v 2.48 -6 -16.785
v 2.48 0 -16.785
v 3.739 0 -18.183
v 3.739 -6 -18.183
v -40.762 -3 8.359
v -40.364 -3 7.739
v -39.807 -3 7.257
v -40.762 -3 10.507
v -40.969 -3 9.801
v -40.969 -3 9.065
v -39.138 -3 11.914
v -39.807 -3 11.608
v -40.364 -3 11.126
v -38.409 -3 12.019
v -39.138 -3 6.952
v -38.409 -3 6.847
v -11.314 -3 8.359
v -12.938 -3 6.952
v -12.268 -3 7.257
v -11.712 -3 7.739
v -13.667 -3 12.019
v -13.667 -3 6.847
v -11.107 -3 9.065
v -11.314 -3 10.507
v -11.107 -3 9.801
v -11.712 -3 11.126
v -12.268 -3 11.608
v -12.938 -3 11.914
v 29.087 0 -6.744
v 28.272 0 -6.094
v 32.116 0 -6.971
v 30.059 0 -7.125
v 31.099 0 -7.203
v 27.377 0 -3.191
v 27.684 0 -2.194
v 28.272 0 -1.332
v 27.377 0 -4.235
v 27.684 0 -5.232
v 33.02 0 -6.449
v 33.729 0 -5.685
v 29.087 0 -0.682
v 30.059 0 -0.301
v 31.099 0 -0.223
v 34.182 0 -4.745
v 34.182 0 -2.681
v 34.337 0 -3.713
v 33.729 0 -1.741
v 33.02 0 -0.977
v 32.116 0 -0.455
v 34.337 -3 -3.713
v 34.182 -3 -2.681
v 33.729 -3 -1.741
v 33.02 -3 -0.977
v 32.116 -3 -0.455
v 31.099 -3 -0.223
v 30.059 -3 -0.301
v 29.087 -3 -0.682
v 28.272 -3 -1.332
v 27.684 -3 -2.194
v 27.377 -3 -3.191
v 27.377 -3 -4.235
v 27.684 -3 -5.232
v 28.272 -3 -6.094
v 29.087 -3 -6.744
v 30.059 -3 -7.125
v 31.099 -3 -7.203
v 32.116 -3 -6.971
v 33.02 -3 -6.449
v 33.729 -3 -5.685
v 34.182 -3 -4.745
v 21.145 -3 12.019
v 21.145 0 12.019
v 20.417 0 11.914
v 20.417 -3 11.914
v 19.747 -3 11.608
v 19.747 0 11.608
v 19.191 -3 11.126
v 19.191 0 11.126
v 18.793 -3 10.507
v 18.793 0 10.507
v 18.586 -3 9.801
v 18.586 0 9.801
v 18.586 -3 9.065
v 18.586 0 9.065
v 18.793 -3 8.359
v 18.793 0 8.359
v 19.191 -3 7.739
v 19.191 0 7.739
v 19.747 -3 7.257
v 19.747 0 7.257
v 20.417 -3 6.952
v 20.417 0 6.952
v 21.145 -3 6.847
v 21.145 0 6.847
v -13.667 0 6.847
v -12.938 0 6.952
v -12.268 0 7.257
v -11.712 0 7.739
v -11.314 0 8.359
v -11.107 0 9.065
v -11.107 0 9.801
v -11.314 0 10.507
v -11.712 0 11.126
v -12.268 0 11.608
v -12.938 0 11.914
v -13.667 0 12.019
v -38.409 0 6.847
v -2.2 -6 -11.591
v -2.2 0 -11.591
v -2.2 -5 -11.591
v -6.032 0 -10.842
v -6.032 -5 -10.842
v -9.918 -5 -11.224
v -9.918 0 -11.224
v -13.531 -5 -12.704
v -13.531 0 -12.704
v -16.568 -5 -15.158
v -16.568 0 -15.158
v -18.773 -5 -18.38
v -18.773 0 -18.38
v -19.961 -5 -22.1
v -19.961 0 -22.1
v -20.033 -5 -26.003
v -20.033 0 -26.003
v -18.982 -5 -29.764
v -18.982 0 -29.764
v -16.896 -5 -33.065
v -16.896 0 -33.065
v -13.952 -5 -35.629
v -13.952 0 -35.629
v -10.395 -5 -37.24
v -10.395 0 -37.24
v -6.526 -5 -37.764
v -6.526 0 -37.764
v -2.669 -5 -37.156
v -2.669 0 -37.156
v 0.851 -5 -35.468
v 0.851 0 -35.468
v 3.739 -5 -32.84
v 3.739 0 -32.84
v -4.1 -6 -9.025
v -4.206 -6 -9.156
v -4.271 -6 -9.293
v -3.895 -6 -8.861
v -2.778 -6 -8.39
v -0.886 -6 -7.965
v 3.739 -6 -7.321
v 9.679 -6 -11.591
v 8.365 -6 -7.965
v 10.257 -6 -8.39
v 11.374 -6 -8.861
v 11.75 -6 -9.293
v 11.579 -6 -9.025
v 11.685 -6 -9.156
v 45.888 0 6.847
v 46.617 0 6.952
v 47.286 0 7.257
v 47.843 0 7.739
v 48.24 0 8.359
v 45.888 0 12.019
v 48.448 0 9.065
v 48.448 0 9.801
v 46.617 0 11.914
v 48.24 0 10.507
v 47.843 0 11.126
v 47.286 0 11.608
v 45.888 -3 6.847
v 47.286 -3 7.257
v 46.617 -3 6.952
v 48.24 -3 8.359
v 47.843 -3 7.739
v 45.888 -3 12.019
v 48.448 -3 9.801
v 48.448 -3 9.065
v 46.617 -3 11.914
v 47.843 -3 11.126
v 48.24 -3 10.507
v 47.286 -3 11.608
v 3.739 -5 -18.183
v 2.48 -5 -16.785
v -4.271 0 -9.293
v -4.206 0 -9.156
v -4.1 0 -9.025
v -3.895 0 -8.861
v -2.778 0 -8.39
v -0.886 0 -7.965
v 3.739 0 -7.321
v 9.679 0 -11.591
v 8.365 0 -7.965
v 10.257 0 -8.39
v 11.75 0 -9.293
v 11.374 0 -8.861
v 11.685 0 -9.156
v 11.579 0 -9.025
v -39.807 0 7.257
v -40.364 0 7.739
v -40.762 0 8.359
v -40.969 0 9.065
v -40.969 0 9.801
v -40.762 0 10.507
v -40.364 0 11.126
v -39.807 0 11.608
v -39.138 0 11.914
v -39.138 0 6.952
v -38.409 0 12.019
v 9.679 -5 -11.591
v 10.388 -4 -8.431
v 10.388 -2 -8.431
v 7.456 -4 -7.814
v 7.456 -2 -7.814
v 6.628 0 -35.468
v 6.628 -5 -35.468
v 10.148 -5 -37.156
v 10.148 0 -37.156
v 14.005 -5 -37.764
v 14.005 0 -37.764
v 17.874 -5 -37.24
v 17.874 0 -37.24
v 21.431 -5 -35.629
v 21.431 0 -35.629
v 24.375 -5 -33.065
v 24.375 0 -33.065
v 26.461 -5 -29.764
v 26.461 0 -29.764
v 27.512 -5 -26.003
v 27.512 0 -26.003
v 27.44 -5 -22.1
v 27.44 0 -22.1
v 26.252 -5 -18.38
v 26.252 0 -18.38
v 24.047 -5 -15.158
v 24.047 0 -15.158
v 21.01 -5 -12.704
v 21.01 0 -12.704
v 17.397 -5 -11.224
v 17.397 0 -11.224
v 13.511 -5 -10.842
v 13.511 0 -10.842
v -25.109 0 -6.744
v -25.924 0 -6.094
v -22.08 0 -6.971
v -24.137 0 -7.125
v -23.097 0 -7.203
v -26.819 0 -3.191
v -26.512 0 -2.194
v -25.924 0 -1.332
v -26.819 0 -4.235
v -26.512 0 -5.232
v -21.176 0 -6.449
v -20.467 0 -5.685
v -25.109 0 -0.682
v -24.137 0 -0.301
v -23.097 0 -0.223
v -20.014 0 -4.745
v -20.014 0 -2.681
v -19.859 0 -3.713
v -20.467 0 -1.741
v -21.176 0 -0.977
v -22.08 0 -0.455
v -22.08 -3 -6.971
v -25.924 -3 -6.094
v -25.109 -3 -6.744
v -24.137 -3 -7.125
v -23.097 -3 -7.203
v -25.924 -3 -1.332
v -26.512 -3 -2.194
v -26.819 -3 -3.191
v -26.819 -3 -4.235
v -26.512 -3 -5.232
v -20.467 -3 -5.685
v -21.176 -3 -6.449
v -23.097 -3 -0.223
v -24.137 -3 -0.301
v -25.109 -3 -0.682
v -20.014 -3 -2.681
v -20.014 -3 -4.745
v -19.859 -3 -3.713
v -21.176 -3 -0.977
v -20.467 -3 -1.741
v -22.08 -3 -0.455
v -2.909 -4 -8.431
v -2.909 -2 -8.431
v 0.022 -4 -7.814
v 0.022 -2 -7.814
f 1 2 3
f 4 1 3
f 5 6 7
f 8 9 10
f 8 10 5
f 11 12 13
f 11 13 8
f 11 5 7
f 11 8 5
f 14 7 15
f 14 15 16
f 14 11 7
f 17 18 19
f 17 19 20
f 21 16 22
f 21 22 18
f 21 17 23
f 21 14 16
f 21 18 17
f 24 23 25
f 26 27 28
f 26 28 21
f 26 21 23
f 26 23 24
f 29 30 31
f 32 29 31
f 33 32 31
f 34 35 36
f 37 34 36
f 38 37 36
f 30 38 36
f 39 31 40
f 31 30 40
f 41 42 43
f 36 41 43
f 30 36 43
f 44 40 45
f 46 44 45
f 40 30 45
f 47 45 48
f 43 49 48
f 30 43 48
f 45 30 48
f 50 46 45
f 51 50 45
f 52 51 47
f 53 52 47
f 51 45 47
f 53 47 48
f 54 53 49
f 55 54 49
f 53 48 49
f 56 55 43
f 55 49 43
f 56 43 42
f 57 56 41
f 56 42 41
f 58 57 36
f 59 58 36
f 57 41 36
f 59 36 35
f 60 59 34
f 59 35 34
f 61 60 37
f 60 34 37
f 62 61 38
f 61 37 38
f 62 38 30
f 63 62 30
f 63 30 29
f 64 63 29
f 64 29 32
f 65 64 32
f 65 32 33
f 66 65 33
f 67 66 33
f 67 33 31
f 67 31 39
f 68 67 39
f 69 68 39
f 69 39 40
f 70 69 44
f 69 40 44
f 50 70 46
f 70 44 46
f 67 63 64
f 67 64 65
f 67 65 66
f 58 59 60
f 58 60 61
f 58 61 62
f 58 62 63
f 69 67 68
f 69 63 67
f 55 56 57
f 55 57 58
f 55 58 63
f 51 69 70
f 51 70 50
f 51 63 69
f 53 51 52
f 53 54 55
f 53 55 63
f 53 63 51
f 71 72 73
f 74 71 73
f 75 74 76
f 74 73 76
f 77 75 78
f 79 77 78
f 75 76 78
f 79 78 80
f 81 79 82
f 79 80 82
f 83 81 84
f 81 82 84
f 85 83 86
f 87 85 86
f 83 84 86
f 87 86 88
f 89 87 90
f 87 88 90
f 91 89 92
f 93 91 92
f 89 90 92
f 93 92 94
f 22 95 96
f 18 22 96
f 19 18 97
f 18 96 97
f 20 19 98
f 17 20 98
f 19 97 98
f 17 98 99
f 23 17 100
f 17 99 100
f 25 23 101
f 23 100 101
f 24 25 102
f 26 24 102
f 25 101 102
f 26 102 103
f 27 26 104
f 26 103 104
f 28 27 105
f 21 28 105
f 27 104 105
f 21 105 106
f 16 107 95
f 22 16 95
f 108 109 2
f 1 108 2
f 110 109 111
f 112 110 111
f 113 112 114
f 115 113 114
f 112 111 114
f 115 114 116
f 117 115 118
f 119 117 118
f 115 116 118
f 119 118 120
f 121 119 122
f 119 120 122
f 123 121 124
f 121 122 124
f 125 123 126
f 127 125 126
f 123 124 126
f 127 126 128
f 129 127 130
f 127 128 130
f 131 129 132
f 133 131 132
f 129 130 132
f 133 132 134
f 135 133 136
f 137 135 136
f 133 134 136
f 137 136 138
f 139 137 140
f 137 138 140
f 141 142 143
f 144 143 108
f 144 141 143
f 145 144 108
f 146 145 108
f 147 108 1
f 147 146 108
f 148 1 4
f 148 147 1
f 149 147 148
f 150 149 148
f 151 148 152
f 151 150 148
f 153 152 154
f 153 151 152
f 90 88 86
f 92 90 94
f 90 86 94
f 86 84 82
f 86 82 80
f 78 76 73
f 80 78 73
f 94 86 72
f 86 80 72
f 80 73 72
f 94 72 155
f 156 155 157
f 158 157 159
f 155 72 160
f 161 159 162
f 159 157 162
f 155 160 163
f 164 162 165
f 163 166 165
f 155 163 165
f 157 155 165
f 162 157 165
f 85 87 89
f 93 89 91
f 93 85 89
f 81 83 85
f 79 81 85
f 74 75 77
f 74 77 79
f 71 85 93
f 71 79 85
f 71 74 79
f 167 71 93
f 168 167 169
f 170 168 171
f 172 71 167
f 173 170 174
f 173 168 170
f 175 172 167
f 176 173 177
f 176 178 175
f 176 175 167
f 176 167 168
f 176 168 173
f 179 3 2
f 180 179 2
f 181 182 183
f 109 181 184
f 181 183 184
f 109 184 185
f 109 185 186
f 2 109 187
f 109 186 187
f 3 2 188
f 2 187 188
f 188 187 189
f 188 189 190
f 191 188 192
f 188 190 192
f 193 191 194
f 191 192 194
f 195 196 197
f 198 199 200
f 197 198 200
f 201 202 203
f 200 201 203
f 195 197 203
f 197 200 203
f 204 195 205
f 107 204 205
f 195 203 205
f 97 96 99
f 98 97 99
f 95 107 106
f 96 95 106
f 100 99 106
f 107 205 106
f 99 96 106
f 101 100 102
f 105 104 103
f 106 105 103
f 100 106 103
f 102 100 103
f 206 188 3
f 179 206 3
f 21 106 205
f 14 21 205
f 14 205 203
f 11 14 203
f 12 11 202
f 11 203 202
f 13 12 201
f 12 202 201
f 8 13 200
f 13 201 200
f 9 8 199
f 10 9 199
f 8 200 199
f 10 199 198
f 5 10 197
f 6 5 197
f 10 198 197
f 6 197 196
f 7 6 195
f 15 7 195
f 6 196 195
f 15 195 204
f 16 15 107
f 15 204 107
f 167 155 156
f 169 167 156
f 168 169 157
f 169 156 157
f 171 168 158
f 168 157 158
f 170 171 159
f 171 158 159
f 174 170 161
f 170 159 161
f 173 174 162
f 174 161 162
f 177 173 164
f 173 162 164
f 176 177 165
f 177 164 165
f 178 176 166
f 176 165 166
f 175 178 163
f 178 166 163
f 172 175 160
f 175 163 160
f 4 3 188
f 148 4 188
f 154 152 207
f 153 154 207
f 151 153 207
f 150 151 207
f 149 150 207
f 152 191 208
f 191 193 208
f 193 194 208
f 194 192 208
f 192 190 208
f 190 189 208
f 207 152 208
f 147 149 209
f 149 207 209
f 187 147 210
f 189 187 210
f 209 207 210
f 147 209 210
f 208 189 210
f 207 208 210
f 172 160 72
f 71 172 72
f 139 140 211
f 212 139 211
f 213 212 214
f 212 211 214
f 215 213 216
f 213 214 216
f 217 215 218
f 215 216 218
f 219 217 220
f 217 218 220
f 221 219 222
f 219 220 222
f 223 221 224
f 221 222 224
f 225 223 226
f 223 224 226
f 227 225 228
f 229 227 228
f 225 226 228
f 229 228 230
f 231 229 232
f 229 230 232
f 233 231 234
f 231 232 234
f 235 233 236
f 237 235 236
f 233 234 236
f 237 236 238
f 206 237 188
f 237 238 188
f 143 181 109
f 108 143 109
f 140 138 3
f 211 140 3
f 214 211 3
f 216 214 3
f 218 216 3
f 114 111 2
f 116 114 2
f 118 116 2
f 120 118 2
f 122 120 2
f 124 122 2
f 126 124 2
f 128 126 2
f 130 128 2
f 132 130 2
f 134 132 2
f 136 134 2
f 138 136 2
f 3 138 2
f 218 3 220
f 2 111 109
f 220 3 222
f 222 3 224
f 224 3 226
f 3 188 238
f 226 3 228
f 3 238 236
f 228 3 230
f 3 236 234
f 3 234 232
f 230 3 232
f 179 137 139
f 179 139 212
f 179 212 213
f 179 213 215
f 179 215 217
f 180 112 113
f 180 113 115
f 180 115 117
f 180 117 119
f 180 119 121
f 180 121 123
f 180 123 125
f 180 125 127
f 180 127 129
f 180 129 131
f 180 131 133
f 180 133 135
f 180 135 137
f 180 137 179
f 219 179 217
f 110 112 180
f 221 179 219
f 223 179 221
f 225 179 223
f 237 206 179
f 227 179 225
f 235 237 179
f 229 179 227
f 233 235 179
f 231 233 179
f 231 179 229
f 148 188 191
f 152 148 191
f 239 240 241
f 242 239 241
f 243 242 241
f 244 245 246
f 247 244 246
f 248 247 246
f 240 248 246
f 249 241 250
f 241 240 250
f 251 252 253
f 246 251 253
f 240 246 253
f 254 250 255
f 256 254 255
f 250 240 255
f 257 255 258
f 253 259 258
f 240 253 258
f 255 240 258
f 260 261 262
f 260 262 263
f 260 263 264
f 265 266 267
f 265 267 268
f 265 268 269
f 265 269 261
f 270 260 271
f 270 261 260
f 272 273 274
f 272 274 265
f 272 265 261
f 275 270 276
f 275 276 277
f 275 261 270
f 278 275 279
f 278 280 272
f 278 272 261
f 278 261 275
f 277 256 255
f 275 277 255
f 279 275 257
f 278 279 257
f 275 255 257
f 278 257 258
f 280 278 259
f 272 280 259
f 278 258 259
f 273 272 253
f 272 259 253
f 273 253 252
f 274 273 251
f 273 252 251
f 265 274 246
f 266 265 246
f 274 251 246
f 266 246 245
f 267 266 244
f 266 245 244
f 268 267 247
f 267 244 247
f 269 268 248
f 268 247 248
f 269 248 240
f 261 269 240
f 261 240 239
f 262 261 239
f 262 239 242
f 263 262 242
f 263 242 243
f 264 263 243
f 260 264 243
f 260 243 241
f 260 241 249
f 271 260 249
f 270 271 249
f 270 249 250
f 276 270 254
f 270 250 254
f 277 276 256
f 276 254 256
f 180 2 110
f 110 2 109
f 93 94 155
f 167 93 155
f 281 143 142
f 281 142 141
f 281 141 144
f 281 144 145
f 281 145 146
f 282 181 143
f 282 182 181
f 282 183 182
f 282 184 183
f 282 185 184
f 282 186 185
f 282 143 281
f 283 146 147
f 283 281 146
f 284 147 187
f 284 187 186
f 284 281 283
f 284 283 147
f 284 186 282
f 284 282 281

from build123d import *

# Parameters (mm, degrees)
F1_DEPTH = 3
F0_R     = 3.5
F2_DEPTH = 5
F3_DEPTH = 6


with BuildPart() as f1:
    # F0 (on Front) → F1 (new body)
    with BuildSketch(Plane.XZ):
        with BuildLine():
            Line((-38.4092436153, 6.8469699793), (-13.666519417, 6.8469699793))
            ThreePointArc((-13.666519417, 6.8469699793), (-11.0805620903, 9.432927306), (-13.666519417, 12.0188846326))
            Line((-13.666519417, 12.0188846326), (-38.4092436153, 12.0188846326))
            ThreePointArc((-38.4092436153, 12.0188846326), (-40.995200942, 9.432927306), (-38.4092436153, 6.8469699793))
        make_face()
    extrude(amount=F1_DEPTH)


with BuildPart() as f1b:
    # F0 (on Front) → F1, piece 2 (new body)
    with BuildSketch(Plane.XZ):
        with BuildLine():
            Line((45.8882047814, 12.0188846326), (21.145480583, 12.0188846326))
            ThreePointArc((21.145480583, 12.0188846326), (18.5595232563, 9.432927306), (21.145480583, 6.8469699793))
            Line((21.145480583, 6.8469699793), (45.8882047814, 6.8469699793))
            ThreePointArc((45.8882047814, 6.8469699793), (48.4741621081, 9.432927306), (45.8882047814, 12.0188846326))
        make_face()
    extrude(amount=F1_DEPTH)


with BuildPart() as f1c:
    # F0 (on Front) → F1, piece 3 (new body)
    with BuildSketch(Plane.XZ):
        with Locations((30.837480583, -3.7130300207)):
            Circle(F0_R)
    extrude(amount=F1_DEPTH)


with BuildPart() as f1d:
    # F0 (on Front) → F1, piece 4 (new body)
    with BuildSketch(Plane.XZ):
        with Locations((-23.358519417, -3.7130300207)):
            Circle(F0_R)
    extrude(amount=F1_DEPTH)


with BuildPart() as f2:
    # F0 (on Front) → F2 (new body)
    with BuildSketch(Plane.XZ):
        with BuildLine():
            Line((3.739480583, -32.8402805437), (3.739480583, -18.1830300207))
            Line((3.739480583, -18.1830300207), (2.4800526234, -16.7852858369))
            Line((2.4800526234, -16.7852858369), (-2.1999505434, -11.591303))
            ThreePointArc((-2.1999505434, -11.591303), (-19.6443103227, -27.9218542992), (3.739480583, -32.8402805437))
        make_face()
        with BuildLine():
            Line((9.6789117095, -11.591303), (3.739480583, -18.1830300207))
            Line((3.739480583, -18.1830300207), (3.739480583, -32.8402805437))
            ThreePointArc((3.739480583, -32.8402805437), (27.1232714887, -27.9218542992), (9.6789117095, -11.591303))
        make_face()
    extrude(amount=F2_DEPTH)


with BuildPart() as f3:
    # F0 (on Front) → F3 (new body)
    with BuildSketch(Plane.XZ):
        with BuildLine():
            Line((2.4800526234, -16.7852858369), (3.739480583, -18.1830300207))
            Line((3.739480583, -18.1830300207), (9.6789117095, -11.591303))
            Line((9.6789117095, -11.591303), (11.750225825, -9.2925075543))
            add(Edge.make_bspline(
                [(11.750225825, -9.2925075543), (11.4351763351, -8.2669545835), (7.5873282408, -7.7940027069), (3.739480583, -7.3210300207)],
                knots=[0.3798207444, 0.3798207444, 0.3798207444, 0.3798207444, 1, 1, 1, 1], degree=3))
            add(Edge.make_bspline(
                [(-4.2712646589, -9.2925075543), (-3.956215169, -8.2669545835), (-0.1083670747, -7.7940027069), (3.739480583, -7.3210300207)],
                knots=[0.3798207444, 0.3798207444, 0.3798207444, 0.3798207444, 1, 1, 1, 1], degree=3))
            Line((-4.2712646589, -9.2925075543), (-2.1999505434, -11.591303))
            Line((-2.1999505434, -11.591303), (2.4800526234, -16.7852858369))
        make_face()
    extrude(amount=F3_DEPTH)


solid = Compound([f1.part, f1b.part, f1c.part, f1d.part, f2.part, f3.part])
